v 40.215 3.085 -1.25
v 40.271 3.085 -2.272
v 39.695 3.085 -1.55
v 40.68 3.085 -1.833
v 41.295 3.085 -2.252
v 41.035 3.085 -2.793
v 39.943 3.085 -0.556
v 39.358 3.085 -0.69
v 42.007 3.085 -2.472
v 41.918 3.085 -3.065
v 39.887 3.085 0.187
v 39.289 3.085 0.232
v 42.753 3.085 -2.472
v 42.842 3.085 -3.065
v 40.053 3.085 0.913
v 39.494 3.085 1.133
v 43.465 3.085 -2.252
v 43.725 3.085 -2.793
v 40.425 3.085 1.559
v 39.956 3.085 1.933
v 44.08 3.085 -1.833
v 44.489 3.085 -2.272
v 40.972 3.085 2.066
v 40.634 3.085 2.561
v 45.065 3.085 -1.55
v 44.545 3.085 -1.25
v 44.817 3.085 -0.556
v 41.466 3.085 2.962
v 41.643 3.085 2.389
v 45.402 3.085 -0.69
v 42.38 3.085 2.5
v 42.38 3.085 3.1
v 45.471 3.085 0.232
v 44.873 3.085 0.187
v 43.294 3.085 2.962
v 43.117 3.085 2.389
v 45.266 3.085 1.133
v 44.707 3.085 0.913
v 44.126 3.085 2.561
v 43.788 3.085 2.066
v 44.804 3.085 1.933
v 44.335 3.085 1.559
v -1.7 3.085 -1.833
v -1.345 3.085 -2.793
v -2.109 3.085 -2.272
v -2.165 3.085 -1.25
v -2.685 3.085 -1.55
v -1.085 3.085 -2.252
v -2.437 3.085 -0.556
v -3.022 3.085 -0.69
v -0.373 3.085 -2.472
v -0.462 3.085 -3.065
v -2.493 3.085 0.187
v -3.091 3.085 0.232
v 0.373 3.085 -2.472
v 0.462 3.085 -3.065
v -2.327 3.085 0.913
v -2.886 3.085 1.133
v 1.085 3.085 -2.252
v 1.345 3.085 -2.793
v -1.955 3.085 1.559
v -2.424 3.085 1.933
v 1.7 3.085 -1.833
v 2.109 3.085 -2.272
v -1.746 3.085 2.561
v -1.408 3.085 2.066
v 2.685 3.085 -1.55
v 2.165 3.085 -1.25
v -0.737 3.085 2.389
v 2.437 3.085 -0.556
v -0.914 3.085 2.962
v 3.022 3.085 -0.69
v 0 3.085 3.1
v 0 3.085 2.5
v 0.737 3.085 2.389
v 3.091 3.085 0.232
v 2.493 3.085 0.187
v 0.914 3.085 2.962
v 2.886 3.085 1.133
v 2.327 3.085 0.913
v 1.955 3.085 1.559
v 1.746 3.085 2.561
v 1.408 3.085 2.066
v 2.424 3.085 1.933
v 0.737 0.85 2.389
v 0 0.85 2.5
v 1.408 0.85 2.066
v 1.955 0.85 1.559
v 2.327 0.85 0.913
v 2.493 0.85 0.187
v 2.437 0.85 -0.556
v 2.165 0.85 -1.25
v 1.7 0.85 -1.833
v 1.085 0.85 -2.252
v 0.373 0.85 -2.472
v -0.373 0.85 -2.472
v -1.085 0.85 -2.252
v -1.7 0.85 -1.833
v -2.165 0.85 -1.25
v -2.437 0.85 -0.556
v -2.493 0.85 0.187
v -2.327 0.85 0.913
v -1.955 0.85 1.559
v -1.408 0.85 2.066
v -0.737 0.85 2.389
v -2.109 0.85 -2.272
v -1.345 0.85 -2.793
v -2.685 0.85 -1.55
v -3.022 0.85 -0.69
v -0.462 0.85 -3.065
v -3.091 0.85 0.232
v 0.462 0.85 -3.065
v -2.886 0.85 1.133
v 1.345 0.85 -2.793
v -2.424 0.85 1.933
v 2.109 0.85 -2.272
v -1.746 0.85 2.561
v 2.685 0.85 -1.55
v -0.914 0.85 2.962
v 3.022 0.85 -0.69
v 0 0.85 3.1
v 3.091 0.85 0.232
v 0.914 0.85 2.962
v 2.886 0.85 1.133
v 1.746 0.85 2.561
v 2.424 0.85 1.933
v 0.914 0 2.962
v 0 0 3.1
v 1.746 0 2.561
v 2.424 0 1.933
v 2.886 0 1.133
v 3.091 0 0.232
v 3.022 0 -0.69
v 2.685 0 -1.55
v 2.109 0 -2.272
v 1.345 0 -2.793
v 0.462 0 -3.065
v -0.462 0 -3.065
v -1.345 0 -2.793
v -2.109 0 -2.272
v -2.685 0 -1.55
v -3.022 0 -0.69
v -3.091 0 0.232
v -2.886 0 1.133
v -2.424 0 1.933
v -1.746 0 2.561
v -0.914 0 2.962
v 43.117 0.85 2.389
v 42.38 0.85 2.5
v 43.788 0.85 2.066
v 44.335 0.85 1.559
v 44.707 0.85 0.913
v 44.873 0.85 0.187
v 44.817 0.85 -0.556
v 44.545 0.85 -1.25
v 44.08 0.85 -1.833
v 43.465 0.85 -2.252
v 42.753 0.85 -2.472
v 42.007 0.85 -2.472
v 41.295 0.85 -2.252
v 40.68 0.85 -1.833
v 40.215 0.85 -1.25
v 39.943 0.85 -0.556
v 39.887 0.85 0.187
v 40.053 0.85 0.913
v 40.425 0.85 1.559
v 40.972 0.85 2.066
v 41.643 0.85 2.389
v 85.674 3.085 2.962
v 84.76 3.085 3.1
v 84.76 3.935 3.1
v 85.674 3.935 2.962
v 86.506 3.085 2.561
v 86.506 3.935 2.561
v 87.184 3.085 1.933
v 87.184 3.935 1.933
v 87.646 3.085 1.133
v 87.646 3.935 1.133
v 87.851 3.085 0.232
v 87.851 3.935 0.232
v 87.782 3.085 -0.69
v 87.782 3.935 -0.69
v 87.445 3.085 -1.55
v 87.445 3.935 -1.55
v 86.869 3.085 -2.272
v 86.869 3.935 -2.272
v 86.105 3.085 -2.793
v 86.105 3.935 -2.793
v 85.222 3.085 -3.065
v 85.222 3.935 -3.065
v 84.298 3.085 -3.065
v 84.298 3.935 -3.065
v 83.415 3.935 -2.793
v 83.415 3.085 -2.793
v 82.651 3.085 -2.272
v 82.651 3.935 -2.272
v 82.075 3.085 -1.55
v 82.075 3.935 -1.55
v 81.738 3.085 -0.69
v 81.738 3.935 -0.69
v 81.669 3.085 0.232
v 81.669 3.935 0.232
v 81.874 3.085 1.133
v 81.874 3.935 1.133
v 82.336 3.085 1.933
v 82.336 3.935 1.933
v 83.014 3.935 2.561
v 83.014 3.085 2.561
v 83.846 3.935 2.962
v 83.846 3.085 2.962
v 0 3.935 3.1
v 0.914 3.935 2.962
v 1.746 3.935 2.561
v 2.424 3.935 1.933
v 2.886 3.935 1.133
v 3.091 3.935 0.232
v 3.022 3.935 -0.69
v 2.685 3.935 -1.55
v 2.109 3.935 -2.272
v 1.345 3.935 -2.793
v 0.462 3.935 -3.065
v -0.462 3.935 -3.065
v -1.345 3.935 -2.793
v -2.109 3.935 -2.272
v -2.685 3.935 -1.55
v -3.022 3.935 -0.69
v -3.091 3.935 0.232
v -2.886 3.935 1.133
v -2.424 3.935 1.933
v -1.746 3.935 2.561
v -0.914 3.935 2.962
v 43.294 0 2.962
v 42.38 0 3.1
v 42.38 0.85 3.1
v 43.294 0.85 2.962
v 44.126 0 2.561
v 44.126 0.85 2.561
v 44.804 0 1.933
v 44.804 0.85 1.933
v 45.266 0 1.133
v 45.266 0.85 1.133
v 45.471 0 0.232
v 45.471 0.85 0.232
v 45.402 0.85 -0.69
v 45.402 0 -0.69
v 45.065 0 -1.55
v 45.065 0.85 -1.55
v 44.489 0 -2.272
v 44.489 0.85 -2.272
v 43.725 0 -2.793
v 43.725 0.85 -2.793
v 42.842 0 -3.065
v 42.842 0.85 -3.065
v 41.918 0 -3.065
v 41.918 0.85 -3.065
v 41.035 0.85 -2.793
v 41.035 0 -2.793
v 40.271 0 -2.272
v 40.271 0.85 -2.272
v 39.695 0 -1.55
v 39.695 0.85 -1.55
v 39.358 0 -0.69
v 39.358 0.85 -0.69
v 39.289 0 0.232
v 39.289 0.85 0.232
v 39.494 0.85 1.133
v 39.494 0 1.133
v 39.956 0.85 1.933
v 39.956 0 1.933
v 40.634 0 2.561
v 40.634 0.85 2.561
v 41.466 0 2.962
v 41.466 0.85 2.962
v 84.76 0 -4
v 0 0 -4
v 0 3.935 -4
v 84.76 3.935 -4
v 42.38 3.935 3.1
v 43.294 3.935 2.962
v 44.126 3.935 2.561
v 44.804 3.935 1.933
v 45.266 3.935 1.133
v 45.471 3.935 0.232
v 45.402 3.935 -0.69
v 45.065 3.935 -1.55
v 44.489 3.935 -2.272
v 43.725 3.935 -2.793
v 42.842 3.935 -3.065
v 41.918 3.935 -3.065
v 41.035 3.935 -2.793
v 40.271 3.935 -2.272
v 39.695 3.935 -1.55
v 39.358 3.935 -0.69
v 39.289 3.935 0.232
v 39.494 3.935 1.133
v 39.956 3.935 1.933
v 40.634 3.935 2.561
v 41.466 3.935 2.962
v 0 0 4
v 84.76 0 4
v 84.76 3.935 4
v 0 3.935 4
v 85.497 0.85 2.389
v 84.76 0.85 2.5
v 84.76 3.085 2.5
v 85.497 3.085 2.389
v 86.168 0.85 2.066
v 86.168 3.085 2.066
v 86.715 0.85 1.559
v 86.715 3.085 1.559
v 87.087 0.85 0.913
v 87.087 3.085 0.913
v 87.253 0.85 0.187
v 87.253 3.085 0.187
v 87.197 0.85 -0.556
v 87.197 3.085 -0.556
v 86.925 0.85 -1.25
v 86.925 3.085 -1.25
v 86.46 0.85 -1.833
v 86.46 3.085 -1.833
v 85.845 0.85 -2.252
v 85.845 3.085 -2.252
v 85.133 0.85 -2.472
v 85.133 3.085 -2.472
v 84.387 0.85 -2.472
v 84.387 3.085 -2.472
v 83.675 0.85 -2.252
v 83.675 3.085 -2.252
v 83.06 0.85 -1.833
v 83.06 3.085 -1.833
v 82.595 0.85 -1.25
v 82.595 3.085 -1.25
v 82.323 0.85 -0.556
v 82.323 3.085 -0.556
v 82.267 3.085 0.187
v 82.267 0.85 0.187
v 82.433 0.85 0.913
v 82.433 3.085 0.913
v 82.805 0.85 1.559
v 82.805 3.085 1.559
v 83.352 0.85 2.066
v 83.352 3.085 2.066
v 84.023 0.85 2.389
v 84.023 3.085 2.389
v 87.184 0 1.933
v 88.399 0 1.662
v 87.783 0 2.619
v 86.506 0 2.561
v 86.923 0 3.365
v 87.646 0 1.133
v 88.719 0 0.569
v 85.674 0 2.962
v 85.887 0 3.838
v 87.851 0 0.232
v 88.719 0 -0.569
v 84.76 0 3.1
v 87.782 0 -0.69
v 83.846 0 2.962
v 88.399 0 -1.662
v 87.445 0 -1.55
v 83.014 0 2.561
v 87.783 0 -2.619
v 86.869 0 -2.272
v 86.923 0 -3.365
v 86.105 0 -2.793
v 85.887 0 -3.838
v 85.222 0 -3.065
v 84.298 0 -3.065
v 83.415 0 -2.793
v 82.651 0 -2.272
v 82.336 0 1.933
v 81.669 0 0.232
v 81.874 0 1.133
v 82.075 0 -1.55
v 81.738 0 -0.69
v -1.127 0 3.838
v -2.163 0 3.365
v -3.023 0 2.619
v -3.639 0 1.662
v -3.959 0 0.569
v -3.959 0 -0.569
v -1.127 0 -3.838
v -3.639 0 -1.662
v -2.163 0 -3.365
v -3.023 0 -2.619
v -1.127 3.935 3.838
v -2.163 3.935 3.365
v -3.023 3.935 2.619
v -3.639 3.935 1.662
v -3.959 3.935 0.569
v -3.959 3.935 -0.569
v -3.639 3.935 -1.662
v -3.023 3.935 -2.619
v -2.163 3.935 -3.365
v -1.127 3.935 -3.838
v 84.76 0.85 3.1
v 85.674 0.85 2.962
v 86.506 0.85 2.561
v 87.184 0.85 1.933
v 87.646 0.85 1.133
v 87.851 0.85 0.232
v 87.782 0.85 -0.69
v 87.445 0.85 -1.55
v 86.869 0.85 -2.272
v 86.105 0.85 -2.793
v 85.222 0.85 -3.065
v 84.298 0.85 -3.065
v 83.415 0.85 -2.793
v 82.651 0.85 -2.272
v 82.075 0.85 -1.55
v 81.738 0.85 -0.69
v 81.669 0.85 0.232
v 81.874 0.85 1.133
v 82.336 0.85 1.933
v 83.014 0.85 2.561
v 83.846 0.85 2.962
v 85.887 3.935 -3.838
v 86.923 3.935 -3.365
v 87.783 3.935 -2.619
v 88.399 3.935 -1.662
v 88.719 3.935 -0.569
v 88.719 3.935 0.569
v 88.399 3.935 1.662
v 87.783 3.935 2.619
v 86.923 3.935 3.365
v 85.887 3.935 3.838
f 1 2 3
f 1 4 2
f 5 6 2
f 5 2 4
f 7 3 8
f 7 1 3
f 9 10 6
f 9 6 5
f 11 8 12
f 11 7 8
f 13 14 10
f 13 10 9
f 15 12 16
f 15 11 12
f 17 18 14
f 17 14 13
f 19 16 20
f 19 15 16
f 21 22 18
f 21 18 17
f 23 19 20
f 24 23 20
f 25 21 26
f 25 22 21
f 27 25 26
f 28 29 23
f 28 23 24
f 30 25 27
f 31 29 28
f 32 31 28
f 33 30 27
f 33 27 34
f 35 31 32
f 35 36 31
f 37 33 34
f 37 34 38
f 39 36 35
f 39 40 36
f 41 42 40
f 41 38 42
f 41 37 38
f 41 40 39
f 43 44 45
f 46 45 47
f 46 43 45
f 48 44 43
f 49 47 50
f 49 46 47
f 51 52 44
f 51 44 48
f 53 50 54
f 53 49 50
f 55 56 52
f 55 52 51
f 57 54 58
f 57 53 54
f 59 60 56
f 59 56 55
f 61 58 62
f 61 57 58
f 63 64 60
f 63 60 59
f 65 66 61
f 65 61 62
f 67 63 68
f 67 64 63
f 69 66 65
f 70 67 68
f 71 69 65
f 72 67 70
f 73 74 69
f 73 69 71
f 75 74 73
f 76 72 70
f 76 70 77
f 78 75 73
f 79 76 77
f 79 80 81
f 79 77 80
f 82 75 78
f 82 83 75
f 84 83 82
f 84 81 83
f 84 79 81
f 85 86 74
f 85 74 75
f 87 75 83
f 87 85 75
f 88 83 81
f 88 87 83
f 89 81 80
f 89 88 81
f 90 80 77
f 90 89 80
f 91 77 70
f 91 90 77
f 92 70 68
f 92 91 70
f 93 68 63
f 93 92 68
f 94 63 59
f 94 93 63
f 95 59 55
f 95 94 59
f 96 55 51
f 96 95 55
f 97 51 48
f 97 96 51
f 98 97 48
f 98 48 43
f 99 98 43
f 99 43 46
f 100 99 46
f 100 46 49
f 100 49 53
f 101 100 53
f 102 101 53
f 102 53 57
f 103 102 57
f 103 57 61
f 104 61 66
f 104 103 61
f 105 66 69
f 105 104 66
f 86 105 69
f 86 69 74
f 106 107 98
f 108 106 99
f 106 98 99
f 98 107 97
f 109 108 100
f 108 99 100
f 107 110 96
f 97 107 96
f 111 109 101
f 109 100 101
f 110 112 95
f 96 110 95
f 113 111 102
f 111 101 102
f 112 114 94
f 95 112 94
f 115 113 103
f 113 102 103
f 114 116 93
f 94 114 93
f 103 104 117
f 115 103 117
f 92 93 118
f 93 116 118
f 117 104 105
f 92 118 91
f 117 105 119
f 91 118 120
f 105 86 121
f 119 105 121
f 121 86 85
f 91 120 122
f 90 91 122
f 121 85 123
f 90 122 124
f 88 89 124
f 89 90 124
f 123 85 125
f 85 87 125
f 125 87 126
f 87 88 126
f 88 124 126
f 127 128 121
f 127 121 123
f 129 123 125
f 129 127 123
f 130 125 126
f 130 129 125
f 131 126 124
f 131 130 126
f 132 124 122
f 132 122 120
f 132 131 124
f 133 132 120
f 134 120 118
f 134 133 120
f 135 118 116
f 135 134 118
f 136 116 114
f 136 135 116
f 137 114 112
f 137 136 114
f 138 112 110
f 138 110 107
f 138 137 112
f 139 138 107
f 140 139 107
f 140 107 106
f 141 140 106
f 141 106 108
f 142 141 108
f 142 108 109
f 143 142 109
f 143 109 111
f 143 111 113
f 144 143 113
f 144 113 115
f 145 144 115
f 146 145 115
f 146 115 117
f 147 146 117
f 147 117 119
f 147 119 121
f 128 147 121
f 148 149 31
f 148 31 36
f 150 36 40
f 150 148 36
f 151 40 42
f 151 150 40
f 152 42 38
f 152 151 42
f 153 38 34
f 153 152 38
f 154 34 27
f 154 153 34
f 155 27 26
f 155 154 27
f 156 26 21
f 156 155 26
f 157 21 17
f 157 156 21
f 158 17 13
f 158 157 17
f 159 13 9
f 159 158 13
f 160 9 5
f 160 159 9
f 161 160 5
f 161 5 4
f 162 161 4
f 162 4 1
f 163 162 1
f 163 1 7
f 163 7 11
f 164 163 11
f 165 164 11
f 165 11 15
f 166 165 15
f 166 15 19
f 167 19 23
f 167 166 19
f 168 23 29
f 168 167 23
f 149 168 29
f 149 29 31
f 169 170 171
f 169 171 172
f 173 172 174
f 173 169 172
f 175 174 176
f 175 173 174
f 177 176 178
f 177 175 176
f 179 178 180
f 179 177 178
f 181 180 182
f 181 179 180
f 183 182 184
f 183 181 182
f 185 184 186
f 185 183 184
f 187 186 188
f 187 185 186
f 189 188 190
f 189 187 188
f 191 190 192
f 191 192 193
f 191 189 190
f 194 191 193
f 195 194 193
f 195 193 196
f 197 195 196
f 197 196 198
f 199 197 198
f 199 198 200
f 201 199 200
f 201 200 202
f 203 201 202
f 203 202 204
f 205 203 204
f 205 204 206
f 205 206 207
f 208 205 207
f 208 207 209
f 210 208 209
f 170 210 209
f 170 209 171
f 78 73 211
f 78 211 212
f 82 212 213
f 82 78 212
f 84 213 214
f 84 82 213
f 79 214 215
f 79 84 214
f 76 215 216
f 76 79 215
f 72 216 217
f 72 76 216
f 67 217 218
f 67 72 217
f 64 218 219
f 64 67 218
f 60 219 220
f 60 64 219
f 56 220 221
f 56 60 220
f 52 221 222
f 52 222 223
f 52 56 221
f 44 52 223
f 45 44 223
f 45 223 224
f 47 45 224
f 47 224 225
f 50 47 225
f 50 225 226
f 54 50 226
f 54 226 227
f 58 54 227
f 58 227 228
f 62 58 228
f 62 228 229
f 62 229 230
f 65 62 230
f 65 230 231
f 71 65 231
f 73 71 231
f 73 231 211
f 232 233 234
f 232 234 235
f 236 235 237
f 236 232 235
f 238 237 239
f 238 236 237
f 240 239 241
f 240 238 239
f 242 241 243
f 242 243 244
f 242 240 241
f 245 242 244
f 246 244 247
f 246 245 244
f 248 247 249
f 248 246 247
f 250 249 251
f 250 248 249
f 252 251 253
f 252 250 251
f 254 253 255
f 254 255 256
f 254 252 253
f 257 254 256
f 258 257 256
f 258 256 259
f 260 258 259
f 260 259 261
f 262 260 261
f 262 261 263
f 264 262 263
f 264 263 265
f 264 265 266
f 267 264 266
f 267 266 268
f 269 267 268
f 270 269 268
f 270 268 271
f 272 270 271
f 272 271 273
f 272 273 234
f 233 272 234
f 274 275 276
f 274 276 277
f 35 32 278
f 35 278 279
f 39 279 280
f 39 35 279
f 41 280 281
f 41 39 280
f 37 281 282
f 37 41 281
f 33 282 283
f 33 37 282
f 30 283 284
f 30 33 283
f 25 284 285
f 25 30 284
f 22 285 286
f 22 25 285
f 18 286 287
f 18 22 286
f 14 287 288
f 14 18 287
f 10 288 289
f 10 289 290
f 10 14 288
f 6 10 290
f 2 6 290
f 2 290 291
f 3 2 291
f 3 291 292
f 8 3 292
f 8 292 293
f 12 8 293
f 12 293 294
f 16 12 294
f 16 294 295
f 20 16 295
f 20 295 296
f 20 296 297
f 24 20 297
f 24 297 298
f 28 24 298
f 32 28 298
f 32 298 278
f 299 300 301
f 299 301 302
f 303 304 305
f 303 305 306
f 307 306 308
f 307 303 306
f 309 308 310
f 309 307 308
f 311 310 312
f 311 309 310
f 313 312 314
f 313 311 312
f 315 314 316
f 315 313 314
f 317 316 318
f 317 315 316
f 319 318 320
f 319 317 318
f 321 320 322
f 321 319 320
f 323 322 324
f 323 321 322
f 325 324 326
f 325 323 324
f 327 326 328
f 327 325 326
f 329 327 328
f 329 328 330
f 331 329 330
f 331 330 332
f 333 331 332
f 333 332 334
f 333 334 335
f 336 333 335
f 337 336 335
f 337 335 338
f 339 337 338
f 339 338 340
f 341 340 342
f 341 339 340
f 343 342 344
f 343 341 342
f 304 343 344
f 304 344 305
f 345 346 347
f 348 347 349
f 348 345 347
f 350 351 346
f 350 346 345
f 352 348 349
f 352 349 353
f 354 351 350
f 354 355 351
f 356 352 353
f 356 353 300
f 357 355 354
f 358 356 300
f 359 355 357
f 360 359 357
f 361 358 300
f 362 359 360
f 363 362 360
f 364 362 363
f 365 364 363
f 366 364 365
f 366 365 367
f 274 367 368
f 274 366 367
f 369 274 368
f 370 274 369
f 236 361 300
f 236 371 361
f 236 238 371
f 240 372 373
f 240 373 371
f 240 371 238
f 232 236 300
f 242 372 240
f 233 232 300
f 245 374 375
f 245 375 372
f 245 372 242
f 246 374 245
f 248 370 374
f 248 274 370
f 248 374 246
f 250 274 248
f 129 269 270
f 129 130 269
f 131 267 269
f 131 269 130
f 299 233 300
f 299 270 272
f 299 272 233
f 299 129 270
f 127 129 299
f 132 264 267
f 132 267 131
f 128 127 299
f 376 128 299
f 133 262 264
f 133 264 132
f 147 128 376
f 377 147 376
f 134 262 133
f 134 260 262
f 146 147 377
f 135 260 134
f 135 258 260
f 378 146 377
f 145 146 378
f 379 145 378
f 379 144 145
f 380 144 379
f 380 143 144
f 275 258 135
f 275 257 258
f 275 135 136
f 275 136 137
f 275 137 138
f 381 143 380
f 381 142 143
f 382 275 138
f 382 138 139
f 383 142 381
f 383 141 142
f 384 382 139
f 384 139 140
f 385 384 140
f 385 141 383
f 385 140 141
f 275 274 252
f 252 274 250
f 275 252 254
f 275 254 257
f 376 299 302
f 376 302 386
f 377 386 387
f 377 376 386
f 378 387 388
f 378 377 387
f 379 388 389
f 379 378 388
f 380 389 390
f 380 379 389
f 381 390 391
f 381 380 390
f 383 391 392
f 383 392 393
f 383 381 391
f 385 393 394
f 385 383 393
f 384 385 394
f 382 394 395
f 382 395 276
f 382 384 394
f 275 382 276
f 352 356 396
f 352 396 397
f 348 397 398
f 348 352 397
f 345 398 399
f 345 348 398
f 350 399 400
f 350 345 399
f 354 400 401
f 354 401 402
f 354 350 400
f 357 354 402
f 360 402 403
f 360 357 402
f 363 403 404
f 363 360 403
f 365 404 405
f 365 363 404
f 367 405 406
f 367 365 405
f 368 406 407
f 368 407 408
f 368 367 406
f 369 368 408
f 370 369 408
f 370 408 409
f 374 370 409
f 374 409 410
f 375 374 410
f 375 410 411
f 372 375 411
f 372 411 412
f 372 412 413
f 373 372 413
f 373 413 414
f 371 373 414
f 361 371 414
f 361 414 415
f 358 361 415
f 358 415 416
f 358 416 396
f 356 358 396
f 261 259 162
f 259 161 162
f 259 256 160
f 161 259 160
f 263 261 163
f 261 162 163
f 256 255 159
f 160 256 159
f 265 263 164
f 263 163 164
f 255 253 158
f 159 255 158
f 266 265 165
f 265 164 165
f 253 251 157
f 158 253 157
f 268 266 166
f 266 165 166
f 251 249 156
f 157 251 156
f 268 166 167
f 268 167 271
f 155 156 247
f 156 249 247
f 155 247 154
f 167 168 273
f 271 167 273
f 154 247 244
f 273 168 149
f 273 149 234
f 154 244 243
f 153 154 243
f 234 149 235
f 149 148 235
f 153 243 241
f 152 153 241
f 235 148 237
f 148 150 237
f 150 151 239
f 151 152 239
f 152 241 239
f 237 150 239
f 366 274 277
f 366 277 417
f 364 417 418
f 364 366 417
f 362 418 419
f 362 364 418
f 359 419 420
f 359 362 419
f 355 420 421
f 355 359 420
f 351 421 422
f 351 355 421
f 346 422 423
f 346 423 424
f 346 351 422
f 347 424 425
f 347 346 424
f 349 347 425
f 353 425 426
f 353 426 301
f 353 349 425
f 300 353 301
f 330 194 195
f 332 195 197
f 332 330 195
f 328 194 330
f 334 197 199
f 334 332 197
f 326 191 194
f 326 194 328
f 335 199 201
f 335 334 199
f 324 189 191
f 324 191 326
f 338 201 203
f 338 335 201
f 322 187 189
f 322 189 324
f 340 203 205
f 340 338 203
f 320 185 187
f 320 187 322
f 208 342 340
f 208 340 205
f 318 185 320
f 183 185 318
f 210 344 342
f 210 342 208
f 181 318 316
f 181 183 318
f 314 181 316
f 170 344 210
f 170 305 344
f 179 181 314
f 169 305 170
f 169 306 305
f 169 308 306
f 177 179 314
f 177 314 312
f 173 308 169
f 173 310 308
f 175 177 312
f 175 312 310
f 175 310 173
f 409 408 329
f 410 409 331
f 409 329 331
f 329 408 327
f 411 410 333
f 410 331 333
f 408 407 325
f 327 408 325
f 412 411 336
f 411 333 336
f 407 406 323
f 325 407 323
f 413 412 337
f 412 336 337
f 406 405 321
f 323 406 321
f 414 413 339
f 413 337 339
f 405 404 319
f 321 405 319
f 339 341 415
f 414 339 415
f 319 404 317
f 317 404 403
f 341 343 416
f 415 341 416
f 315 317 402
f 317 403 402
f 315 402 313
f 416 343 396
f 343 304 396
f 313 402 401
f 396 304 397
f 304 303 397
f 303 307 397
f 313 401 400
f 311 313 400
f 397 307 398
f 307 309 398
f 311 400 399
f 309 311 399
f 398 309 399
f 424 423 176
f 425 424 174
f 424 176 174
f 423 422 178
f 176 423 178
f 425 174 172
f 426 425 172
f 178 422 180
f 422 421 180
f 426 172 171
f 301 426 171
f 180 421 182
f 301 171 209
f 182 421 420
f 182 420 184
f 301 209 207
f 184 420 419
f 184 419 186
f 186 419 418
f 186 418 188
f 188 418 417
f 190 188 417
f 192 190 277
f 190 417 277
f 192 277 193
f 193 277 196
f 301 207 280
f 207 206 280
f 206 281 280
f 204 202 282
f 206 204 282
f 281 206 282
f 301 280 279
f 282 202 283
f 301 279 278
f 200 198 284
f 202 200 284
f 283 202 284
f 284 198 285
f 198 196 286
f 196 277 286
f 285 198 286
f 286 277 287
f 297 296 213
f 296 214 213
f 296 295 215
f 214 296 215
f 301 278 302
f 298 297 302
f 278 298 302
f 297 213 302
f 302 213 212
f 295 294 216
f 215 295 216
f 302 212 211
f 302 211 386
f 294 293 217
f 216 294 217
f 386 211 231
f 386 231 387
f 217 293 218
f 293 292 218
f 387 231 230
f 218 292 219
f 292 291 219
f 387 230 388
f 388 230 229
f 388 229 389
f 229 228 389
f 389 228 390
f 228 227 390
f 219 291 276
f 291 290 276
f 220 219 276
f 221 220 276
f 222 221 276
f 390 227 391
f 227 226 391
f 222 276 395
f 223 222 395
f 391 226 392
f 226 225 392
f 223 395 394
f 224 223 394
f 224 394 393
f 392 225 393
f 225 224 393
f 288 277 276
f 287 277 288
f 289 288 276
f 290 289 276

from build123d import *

# Parameters (mm, degrees)
CROQUIS1_R              = 3.1
SALIENTE_EXTRUIR1_DEPTH = 3.935
SALIENTE_EXTRUIR2_START = 0.85
CROQUIS1_3_R            = 3.1
CROQUIS1_3_R_2          = 2.5
SALIENTE_EXTRUIR2_DEPTH = 2.235


with BuildPart() as part:
    # Croquis1 → Saliente-Extruir1 (new body)
    with BuildSketch(Plane(origin=(0, 0, 0), x_dir=(1, 0, 0), z_dir=(0, 1, 0))):
        with BuildLine():
            Line((0, 4), (84.76, 4))
            ThreePointArc((84.76, 4), (88.76, 0), (84.76, -4))
            Line((84.76, -4), (0, -4))
            ThreePointArc((0, -4), (-4, 0), (0, 4))
        make_face()
        with Locations(Location((0, 0, 0), (0, 0, 270))):
            Circle(CROQUIS1_R, mode=Mode.SUBTRACT)
        with Locations(Location((84.76, 0, 0), (0, 0, 270))):
            Circle(CROQUIS1_R, mode=Mode.SUBTRACT)
        with Locations(Location((42.38, 0, 0), (0, 0, 270))):
            Circle(CROQUIS1_R, mode=Mode.SUBTRACT)
    extrude(amount=SALIENTE_EXTRUIR1_DEPTH)

    # Croquis1<3> → Saliente-Extruir2 (add)
    # profile 1 of 3: a face of its own
    with BuildSketch(Plane(origin=(0, 0, 0), x_dir=(1, 0, 0), z_dir=(0, 1, 0)).offset(SALIENTE_EXTRUIR2_START)):
        with Locations(Location((0, 0, 0), (0, 0, 270))):
            Circle(CROQUIS1_3_R)
        with Locations(Location((0, 0, 0), (0, 0, 270))):
            Circle(CROQUIS1_3_R_2, mode=Mode.SUBTRACT)
    # profile 2 of 3: a face of its own
    with BuildSketch(Plane(origin=(0, 0, 0), x_dir=(1, 0, 0), z_dir=(0, 1, 0)).offset(SALIENTE_EXTRUIR2_START)):
        with Locations(Location((84.76, 0, 0), (0, 0, 270))):
            Circle(CROQUIS1_3_R)
        with Locations(Location((84.76, 0, 0), (0, 0, 270))):
            Circle(CROQUIS1_3_R_2, mode=Mode.SUBTRACT)
    # profile 3 of 3: a face of its own
    with BuildSketch(Plane(origin=(0, 0, 0), x_dir=(1, 0, 0), z_dir=(0, 1, 0)).offset(SALIENTE_EXTRUIR2_START)):
        with Locations(Location((42.38, 0, 0), (0, 0, 270))):
            Circle(CROQUIS1_3_R)
        with Locations(Location((42.38, 0, 0), (0, 0, 270))):
            Circle(CROQUIS1_3_R_2, mode=Mode.SUBTRACT)
    extrude(amount=SALIENTE_EXTRUIR2_DEPTH)


solid = part.part
